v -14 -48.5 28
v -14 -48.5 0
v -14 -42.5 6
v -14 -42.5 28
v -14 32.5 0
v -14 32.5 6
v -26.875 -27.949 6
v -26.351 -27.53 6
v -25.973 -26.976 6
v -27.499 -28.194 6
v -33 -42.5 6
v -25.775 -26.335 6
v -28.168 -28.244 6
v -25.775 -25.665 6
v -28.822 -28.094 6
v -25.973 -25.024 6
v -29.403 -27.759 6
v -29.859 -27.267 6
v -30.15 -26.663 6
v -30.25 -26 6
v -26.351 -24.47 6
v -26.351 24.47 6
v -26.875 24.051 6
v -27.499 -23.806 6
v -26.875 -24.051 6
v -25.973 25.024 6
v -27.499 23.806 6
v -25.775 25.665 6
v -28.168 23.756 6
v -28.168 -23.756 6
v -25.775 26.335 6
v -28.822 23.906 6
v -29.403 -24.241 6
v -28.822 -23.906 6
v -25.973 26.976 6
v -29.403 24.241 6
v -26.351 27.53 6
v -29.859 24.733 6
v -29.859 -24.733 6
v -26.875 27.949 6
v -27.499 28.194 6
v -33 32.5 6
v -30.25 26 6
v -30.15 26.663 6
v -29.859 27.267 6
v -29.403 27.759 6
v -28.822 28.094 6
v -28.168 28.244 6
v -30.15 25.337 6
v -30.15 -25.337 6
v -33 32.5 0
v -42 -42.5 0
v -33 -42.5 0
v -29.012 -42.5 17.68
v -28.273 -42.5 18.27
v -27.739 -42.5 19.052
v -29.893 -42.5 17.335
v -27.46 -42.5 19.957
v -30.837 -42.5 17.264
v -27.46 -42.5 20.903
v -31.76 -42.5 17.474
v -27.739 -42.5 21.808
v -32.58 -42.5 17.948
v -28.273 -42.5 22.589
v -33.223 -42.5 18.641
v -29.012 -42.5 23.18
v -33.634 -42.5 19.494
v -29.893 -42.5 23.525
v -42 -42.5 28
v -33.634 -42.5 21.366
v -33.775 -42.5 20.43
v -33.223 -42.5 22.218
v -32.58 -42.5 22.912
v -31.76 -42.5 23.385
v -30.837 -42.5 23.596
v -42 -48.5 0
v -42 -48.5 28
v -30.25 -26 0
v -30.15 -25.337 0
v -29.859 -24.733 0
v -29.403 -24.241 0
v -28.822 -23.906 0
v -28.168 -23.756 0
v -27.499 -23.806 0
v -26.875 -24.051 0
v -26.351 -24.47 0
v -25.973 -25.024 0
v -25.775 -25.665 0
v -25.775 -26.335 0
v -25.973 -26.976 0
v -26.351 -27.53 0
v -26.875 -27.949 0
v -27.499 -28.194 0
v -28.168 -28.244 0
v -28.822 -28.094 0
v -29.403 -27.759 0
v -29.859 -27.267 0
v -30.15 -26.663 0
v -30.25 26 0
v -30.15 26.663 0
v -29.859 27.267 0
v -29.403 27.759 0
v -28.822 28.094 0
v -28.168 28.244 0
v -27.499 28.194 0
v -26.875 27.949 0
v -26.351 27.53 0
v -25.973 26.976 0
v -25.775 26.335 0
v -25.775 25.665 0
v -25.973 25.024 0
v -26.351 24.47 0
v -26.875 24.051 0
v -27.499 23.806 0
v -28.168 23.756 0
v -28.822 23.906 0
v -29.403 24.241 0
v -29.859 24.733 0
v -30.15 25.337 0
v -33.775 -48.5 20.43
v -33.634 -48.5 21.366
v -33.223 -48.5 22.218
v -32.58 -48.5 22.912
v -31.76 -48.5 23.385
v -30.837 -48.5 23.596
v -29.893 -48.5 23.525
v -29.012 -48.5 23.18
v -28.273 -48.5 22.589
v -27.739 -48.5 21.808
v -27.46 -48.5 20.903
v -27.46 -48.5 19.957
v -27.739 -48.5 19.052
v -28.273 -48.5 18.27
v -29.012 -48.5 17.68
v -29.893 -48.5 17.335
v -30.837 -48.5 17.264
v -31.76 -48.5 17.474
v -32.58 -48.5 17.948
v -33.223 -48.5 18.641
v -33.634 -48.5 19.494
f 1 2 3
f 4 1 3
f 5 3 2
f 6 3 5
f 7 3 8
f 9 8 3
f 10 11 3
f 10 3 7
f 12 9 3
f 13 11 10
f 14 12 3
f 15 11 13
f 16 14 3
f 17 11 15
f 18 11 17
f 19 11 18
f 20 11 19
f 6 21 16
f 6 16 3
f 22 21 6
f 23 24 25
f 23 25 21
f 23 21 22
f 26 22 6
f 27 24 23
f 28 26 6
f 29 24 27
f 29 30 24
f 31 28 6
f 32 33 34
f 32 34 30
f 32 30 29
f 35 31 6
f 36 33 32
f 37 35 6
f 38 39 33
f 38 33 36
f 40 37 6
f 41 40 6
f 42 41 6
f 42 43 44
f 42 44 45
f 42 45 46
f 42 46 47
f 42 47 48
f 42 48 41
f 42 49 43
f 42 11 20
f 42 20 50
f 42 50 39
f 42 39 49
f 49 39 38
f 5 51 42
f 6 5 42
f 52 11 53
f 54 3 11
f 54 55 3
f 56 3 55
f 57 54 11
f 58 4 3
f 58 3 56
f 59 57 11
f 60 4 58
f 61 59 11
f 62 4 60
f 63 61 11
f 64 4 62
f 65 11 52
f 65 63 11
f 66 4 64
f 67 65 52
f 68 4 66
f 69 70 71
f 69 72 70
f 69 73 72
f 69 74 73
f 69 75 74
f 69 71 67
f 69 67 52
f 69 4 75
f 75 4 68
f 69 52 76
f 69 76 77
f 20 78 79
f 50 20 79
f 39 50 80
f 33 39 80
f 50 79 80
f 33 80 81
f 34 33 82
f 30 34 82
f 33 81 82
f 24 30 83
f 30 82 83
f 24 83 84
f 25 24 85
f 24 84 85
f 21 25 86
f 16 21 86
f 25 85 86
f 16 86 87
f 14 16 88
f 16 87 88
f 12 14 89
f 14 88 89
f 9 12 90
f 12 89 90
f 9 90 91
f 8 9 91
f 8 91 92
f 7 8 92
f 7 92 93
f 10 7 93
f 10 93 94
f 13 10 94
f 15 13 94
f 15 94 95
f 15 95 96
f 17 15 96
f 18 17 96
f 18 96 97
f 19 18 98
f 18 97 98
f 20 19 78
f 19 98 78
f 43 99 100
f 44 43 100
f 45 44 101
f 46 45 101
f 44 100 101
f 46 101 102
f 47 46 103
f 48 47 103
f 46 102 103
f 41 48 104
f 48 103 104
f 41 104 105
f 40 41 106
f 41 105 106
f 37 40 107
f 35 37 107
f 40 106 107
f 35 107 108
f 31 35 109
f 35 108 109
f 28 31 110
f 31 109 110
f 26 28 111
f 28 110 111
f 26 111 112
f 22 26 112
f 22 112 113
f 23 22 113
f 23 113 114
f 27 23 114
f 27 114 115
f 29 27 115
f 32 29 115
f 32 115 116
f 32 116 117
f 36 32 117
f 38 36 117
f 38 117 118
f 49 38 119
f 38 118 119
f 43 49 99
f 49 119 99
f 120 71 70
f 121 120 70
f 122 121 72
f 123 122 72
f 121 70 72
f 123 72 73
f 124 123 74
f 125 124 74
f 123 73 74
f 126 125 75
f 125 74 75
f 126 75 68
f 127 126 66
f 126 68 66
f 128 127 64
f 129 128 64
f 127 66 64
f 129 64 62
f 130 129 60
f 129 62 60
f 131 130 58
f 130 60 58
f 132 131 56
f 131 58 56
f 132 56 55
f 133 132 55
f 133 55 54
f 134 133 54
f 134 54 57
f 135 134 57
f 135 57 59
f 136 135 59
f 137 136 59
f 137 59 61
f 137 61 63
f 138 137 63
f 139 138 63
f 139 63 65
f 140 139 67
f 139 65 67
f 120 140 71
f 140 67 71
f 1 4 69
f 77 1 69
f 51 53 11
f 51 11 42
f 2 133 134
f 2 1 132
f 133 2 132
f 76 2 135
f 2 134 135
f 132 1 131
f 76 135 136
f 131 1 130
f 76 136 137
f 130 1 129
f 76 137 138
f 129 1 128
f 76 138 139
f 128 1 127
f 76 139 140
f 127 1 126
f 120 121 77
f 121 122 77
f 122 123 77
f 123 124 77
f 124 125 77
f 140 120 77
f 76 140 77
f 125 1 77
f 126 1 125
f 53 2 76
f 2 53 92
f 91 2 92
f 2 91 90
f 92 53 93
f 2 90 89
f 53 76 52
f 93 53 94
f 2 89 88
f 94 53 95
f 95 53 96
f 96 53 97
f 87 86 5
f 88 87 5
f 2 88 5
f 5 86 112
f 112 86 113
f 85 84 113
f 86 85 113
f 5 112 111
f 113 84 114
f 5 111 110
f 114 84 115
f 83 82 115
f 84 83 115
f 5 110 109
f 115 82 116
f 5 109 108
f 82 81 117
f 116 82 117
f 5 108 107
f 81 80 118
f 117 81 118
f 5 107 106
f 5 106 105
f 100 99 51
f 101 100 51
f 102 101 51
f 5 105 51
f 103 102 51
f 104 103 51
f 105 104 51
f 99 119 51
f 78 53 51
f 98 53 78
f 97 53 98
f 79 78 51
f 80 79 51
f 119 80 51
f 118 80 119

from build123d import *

# Parameters (mm, degrees)
SKETCH1_W               = 10
SKETCH1_H               = 10
SKETCH1_H_2             = 65
SKETCH1_R               = 2.25
BOSS_EXTRUDE1_DEPTH     = 6
SKETCH2_W               = 28
SKETCH2_H               = 28
SKETCH2_R               = 3.175
BOSS_EXTRUDE2_DEPTH     = 6
SKETCH3_W               = 6
SKETCH3_H               = 75
BOSS_EXTRUDE3_DEPTH     = 9
SKETCH4_W               = 54.205081497
SKETCH4_H               = 103.631562047
CUT_EXTRUDE1_DEPTH      = 23
CUT_EXTRUDE1_DEPTH_BACK = 7


with BuildPart() as part:
    # Sketch1 → Boss-Extrude1 (new body)
    with BuildSketch(Plane.XY):
        with Locations((0, -37.5)):
            Rectangle(SKETCH1_W, SKETCH1_H)
        Rectangle(SKETCH1_W, SKETCH1_H_2)
        with Locations((0, 26)):
            Circle(SKETCH1_R, mode=Mode.SUBTRACT)
        with Locations((0, -26)):
            Circle(SKETCH1_R, mode=Mode.SUBTRACT)
    extrude(amount=BOSS_EXTRUDE1_DEPTH)



with BuildPart() as body_2:
    # Sketch2 → Boss-Extrude2 (new body)
    with BuildSketch(Plane.XZ.offset(42.5)):
        with Locations((0, 14)):
            Rectangle(SKETCH2_W, SKETCH2_H)
        with Locations((2.6, 20.429948245)):
            Circle(SKETCH2_R, mode=Mode.SUBTRACT)
    extrude(amount=BOSS_EXTRUDE2_DEPTH)


with BuildPart() as part_1:
    add(part.part)

    add(body_2.part)  # Boss-Extrude3 merges body 2
    # Sketch3 → Boss-Extrude3 (add)
    with BuildSketch(Plane.ZY.offset(5)):
        with Locations((3, -5)):
            Rectangle(SKETCH3_W, SKETCH3_H)
    extrude(amount=BOSS_EXTRUDE3_DEPTH)

    # Mirror1: part across plane


with BuildPart() as part_2:
    add(part_1.part)
    add(part_1.part.mirror(Plane(origin=(-14, -48.5, 0), x_dir=(0, 0, 1), z_dir=(-1, 0, 0))))

    # Sketch4 → Cut-Extrude1 (cut, two sides)
    with BuildSketch(Plane.XY.offset(6)) as cut_extrude1_sk:
        with Locations((13.102540749, -19.315781024)):
            Rectangle(SKETCH4_W, SKETCH4_H)
    extrude(amount=CUT_EXTRUDE1_DEPTH, mode=Mode.SUBTRACT)
    extrude(cut_extrude1_sk.sketch, amount=-CUT_EXTRUDE1_DEPTH_BACK, mode=Mode.SUBTRACT)


solid = part_2.part
